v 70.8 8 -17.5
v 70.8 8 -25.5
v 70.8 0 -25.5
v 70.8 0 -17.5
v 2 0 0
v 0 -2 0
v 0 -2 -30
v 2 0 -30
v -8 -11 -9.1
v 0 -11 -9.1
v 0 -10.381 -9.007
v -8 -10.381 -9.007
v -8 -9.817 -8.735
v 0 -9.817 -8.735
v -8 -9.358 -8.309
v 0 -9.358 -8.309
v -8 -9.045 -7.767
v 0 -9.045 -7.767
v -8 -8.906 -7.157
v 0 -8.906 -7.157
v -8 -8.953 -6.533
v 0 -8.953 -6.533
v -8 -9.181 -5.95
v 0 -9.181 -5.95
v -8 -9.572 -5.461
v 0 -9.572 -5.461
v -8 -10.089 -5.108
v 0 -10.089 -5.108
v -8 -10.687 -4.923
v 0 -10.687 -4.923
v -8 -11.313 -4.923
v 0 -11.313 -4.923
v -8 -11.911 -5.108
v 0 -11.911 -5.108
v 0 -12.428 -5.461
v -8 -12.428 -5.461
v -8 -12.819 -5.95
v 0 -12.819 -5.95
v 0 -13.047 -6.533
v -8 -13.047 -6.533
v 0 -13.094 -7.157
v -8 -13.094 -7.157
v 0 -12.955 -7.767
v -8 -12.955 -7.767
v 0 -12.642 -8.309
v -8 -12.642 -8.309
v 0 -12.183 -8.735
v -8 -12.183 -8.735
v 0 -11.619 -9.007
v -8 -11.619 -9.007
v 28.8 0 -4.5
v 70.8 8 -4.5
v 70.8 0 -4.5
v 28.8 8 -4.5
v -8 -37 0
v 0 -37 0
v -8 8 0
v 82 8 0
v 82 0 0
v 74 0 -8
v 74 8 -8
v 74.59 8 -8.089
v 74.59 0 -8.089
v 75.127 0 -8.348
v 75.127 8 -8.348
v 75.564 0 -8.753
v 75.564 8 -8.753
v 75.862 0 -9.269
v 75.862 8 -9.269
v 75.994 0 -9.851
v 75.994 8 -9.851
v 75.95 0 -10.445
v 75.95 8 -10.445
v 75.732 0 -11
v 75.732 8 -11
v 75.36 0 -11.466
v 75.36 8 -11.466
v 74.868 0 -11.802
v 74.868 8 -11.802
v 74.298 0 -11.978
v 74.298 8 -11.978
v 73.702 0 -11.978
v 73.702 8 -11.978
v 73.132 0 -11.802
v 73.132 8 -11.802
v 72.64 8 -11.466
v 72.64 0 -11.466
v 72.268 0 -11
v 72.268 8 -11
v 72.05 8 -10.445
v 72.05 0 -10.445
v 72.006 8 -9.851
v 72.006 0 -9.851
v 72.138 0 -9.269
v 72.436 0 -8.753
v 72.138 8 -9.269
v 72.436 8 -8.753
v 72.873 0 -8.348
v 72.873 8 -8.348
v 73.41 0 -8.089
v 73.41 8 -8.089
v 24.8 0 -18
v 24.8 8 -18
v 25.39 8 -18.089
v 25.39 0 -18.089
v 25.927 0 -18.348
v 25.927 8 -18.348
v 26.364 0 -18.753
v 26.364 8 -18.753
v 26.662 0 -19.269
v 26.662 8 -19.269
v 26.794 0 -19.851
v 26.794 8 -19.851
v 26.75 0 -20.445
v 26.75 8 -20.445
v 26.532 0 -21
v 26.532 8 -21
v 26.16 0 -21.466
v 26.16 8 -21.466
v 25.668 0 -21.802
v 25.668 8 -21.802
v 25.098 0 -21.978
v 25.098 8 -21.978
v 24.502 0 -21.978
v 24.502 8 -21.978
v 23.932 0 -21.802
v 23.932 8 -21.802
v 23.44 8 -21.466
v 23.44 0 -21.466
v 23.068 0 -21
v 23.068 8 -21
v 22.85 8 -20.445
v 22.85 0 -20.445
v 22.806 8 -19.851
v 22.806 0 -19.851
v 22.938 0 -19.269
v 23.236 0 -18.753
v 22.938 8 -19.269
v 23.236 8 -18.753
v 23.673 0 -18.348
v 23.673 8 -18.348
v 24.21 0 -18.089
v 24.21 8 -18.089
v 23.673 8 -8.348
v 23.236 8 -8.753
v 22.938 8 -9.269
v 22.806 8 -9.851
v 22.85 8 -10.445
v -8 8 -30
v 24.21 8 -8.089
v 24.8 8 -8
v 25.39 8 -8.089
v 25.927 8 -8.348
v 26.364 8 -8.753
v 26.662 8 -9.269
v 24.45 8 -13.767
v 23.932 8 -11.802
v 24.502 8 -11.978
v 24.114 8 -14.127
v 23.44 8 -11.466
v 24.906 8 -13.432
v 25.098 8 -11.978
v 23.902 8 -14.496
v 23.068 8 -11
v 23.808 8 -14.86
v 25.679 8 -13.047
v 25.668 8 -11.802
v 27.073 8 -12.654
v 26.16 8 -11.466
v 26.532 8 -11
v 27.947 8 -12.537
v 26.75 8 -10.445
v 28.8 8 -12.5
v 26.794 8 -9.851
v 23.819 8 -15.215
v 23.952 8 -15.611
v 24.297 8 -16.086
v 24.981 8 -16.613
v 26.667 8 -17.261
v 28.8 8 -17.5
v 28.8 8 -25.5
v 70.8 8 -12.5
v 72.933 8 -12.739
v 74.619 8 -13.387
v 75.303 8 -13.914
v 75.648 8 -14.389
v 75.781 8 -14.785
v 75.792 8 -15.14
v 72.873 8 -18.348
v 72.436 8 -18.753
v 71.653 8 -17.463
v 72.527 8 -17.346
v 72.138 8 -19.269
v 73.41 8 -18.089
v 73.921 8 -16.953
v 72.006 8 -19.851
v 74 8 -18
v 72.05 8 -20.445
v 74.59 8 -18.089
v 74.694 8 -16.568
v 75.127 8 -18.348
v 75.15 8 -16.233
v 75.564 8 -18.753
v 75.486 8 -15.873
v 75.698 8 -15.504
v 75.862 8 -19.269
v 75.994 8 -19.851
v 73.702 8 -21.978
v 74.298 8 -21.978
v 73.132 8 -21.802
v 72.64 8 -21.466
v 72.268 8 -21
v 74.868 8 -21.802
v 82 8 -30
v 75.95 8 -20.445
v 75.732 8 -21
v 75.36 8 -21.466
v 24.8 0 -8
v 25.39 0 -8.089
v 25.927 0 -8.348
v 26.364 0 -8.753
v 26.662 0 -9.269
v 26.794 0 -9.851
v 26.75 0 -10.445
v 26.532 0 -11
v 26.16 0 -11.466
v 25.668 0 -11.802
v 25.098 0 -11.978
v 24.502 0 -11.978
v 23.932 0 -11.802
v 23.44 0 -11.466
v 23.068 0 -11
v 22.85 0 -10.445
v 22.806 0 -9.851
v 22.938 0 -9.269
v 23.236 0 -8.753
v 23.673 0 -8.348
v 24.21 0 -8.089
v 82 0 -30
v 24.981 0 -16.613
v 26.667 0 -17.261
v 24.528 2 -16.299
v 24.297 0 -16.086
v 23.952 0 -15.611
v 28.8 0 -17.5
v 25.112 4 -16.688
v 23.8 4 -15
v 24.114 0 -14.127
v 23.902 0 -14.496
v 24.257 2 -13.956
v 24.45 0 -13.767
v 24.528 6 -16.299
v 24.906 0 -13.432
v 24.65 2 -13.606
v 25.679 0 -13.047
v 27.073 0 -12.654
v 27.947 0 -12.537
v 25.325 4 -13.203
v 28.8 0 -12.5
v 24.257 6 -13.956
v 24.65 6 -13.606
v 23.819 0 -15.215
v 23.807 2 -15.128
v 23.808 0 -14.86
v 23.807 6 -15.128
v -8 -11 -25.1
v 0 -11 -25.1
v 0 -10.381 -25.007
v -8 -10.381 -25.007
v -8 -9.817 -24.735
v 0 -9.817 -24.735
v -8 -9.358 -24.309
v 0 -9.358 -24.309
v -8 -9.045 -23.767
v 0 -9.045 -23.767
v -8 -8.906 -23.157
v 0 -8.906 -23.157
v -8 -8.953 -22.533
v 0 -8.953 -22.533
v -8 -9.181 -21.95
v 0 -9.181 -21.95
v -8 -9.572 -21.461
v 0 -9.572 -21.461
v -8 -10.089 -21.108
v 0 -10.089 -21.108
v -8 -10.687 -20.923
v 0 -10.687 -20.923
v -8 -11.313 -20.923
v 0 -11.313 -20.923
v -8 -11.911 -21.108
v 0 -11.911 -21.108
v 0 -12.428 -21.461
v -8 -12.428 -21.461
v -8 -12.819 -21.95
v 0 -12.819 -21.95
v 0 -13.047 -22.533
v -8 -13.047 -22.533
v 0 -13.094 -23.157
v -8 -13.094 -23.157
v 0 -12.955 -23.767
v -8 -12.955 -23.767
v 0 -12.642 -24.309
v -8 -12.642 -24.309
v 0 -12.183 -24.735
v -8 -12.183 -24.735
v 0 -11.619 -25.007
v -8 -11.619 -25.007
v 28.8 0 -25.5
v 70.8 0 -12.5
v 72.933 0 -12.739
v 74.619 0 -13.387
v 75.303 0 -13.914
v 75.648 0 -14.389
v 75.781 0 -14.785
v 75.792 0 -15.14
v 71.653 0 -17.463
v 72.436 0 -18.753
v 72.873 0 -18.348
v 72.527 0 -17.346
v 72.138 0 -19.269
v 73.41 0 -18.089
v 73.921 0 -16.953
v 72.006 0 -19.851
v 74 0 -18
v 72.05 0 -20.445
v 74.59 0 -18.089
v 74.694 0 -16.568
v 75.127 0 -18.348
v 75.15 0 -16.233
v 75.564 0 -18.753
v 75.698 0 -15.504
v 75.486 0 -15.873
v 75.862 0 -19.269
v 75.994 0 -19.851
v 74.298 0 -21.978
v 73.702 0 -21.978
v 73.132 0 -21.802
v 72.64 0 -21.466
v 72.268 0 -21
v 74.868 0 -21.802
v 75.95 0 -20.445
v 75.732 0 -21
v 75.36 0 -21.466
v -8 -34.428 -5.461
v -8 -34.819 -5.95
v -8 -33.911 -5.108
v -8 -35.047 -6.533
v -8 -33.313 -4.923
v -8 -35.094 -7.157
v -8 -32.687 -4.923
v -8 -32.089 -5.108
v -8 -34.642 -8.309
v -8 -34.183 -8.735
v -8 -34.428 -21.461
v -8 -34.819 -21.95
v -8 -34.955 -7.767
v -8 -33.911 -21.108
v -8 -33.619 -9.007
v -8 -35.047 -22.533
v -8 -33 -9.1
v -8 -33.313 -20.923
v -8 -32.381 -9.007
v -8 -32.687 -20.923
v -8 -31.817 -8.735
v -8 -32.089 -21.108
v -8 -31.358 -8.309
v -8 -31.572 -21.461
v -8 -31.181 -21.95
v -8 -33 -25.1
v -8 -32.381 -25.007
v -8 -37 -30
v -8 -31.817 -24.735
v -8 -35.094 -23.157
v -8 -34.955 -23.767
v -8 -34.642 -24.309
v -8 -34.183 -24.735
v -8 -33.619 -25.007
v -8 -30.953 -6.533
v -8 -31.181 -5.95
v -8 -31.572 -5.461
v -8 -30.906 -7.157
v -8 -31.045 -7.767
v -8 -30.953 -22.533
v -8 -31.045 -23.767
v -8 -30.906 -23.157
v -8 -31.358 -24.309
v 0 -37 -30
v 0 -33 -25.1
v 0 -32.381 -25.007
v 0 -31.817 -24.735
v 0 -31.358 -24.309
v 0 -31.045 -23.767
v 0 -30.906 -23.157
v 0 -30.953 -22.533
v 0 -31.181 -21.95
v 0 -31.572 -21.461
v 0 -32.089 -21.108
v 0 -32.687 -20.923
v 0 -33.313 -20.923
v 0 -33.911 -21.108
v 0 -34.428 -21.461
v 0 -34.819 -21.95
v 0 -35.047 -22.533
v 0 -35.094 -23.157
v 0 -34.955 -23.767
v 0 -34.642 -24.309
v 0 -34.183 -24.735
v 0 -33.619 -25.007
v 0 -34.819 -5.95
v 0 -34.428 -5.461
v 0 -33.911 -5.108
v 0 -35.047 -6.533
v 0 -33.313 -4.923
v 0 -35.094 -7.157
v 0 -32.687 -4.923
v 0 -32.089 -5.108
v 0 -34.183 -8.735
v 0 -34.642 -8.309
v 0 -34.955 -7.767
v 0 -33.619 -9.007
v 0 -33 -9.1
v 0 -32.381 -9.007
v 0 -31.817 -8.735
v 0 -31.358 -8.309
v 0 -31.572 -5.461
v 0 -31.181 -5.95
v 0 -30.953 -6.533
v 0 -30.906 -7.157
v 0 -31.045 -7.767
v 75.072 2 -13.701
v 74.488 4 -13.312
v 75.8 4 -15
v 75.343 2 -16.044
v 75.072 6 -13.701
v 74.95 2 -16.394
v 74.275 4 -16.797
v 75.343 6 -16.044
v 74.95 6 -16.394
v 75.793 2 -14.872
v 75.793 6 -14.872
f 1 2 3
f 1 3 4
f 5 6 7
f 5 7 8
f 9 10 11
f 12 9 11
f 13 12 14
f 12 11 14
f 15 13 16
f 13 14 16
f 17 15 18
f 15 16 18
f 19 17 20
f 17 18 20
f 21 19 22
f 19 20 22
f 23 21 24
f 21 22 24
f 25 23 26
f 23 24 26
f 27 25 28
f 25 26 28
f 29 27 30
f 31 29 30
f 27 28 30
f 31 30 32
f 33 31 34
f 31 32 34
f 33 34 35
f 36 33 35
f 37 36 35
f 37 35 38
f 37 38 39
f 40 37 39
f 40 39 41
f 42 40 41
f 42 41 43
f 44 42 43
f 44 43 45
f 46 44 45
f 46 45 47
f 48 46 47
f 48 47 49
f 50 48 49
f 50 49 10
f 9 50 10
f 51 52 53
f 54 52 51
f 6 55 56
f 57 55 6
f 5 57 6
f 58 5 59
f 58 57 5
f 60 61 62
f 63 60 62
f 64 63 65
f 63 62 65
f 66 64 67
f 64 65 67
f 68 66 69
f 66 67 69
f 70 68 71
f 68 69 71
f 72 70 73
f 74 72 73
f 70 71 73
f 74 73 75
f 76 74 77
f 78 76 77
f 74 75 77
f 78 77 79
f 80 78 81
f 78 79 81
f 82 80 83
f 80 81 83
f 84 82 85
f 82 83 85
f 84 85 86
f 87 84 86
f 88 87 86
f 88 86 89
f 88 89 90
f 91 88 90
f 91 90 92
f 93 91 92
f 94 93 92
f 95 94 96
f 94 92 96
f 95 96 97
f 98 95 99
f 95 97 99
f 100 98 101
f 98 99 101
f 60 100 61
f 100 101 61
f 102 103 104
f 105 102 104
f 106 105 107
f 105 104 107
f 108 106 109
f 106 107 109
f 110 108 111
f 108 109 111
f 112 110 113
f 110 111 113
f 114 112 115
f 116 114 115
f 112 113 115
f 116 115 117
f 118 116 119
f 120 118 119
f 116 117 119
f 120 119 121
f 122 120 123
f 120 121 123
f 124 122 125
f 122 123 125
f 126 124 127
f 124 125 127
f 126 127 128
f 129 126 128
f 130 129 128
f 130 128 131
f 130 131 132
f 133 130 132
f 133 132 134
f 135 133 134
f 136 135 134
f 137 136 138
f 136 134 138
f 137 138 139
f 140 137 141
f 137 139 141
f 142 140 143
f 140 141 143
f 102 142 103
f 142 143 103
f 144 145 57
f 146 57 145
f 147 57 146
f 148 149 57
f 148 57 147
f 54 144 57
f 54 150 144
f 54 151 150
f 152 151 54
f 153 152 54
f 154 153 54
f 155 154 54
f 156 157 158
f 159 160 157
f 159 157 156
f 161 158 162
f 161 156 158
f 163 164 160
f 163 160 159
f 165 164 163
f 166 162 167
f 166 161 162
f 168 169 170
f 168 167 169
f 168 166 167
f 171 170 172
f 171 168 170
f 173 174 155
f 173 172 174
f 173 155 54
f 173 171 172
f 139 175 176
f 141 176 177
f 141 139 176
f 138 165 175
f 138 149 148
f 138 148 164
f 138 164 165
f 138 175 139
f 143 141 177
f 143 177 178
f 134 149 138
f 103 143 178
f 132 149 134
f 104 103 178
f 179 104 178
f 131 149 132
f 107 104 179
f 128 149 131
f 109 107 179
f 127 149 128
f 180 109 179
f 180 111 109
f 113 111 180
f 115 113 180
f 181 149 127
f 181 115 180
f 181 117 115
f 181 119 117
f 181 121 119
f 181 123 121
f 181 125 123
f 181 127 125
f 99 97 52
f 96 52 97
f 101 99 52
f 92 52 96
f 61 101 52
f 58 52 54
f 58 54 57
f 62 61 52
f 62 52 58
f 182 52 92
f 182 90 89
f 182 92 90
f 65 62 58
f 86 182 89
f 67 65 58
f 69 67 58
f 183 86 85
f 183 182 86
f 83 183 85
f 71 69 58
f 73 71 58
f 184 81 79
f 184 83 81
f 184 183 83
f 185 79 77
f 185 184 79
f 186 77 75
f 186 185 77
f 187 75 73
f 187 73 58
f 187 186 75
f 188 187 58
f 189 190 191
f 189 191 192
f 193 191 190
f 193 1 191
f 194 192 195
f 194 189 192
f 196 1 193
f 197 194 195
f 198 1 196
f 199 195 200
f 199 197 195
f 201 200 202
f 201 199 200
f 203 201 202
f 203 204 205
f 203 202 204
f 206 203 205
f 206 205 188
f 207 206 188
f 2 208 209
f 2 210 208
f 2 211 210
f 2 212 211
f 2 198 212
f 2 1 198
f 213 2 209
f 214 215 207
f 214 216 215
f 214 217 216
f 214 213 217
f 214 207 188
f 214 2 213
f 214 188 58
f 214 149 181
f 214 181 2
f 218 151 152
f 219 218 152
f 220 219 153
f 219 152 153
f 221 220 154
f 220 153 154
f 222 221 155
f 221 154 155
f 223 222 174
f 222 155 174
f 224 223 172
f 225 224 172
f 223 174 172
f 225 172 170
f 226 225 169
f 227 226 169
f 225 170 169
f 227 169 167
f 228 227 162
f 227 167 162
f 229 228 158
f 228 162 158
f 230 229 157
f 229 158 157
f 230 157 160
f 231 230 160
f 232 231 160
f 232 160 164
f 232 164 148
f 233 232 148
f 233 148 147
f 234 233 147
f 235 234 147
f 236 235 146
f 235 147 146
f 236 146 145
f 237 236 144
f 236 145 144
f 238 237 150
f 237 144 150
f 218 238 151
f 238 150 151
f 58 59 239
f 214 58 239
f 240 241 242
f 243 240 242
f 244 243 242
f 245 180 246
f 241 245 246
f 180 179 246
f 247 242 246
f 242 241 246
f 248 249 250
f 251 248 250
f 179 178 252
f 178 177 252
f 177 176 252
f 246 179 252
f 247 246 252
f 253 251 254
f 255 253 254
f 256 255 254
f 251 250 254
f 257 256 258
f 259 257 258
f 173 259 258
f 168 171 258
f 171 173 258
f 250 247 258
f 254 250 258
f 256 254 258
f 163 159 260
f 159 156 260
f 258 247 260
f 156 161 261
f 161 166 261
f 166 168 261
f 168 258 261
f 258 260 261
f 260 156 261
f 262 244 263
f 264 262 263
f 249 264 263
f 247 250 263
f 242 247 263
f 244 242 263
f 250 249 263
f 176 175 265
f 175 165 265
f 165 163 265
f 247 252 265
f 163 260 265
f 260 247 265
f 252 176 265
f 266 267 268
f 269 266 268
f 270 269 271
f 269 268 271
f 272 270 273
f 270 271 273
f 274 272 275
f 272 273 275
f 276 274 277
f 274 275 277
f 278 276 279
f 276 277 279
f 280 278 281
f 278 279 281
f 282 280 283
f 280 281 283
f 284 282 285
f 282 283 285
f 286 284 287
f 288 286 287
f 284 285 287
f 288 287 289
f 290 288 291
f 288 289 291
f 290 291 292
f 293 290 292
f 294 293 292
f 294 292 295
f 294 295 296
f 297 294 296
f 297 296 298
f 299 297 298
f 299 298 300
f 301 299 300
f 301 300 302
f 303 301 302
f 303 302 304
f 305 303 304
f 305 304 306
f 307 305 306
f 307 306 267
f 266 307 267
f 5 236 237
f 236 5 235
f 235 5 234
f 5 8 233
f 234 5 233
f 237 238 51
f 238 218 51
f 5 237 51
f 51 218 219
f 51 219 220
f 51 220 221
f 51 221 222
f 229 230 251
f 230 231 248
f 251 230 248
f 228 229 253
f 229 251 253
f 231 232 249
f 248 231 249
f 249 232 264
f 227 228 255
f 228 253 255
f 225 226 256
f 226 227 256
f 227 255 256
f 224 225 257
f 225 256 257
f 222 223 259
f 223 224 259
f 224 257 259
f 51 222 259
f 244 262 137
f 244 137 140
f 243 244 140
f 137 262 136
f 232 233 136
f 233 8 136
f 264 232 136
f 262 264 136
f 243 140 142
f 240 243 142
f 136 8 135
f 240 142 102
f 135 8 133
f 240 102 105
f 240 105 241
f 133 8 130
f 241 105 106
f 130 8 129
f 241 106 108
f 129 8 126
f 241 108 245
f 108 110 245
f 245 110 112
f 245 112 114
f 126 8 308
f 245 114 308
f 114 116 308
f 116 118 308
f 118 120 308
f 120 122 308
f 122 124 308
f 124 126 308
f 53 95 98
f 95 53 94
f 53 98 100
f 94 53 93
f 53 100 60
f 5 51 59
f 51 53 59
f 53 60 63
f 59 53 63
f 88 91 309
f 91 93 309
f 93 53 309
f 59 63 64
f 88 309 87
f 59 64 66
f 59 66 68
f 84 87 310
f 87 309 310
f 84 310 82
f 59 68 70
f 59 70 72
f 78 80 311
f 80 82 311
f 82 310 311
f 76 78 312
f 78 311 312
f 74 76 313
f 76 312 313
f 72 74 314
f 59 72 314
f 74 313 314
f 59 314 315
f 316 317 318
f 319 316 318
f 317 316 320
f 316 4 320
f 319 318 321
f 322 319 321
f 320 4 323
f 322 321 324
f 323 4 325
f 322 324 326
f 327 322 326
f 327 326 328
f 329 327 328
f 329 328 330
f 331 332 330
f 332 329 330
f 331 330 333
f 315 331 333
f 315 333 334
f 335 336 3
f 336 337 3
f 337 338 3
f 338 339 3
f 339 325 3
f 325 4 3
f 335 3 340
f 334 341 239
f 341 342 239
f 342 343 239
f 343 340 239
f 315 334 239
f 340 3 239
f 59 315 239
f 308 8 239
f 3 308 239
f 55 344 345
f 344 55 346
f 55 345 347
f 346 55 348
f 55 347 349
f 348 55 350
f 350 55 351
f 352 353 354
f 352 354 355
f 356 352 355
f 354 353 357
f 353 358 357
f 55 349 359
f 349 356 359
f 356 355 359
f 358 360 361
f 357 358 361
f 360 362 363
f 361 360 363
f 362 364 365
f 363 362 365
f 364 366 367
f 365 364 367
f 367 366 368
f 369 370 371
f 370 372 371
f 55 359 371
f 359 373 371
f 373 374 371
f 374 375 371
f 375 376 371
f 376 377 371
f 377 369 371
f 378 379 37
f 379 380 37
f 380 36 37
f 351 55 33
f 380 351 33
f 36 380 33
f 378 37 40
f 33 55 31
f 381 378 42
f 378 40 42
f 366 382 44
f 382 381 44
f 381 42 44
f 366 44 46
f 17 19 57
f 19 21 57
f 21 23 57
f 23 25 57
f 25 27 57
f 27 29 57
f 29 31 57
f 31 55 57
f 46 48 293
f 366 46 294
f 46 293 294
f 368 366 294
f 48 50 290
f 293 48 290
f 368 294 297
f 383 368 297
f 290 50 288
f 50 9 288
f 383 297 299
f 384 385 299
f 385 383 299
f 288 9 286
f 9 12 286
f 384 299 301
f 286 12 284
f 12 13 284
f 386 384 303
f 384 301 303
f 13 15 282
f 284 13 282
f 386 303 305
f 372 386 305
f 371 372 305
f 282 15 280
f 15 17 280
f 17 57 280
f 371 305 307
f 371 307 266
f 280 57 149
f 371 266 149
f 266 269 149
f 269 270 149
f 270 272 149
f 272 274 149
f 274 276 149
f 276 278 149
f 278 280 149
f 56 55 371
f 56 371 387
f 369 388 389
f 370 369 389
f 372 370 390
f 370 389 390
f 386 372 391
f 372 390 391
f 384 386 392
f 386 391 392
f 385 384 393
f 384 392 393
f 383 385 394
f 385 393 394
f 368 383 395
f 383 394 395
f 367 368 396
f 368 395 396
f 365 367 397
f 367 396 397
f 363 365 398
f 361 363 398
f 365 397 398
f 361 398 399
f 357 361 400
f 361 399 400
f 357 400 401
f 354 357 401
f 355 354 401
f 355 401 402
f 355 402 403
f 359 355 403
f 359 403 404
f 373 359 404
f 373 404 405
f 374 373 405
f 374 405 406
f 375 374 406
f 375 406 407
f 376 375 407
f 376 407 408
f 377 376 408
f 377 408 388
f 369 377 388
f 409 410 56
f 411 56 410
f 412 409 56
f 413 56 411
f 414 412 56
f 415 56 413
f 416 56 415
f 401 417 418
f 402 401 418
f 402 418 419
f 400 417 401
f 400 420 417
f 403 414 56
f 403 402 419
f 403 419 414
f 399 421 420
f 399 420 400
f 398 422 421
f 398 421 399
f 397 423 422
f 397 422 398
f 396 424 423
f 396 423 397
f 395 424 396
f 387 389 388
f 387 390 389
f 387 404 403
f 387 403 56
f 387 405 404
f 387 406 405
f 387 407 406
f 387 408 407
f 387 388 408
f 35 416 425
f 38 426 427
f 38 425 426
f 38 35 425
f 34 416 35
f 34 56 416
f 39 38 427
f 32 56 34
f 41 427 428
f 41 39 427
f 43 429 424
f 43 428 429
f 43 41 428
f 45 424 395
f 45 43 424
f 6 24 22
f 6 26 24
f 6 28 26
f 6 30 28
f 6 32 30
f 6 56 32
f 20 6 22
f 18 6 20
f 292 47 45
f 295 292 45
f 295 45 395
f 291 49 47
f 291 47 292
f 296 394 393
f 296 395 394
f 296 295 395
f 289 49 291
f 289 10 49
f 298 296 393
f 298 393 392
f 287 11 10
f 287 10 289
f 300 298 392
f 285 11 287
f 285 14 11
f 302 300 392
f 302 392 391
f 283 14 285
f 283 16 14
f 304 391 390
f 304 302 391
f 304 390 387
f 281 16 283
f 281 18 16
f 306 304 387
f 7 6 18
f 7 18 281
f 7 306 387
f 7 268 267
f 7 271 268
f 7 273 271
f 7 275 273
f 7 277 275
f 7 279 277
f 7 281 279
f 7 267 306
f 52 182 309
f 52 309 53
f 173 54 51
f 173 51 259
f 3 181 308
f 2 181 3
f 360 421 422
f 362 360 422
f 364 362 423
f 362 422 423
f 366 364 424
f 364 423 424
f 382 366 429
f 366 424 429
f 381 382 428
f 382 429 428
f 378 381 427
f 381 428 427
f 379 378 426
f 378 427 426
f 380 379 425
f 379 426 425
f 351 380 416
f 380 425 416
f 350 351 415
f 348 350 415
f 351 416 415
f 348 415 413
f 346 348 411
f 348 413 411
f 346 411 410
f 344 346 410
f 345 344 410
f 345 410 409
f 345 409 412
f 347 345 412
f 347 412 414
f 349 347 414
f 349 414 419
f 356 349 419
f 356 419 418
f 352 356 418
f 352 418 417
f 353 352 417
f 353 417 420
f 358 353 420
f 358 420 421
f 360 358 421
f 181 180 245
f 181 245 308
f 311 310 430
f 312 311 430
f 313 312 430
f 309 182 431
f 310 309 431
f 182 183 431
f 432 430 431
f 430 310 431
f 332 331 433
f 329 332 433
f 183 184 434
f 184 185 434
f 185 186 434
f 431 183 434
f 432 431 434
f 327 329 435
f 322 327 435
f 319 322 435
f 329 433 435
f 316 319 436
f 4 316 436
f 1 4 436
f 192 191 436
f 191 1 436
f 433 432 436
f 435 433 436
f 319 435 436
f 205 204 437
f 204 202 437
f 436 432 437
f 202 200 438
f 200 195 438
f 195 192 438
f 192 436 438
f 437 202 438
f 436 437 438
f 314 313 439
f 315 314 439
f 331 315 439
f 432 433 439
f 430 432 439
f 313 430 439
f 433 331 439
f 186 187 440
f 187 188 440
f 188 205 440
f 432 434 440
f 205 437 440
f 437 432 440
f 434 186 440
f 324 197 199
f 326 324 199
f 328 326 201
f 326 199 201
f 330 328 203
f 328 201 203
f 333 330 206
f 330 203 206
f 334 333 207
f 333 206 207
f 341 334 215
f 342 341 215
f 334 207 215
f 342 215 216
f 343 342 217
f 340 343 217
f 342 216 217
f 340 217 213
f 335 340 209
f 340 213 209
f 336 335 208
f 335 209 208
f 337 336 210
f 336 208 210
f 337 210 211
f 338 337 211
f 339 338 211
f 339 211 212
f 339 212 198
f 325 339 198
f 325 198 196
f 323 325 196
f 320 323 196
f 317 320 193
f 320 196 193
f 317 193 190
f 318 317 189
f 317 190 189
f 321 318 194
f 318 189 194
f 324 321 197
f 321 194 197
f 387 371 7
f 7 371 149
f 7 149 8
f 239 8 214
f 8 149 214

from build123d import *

# Parameters (mm, degrees)
SKETCH_1_W          = 82
SKETCH_1_H          = 30
EXTRUDE_1_DEPTH     = 8
SKETCH_2_R          = 2
CUT_EXTRUDE_1_DEPTH = 8
SKETCH_4_W          = 8
SKETCH_4_H          = 30
EXTRUDE_2_DEPTH     = 45
EXTRUDE_5_DEPTH     = 30
SKETCH_15_R         = 2.1
CUT_EXTRUDE_2_DEPTH = 10


with BuildPart() as part:
    # 草圖1 → 填料-伸長1 (new body)
    with BuildSketch(Plane(origin=(0, 0, 0), x_dir=(1, 0, 0), z_dir=(0, 1, 0))):
        with Locations((41, 15)):
            Rectangle(SKETCH_1_W, SKETCH_1_H)
    extrude(amount=EXTRUDE_1_DEPTH)

    # 草圖2 → 除料-伸長1 (cut)
    with BuildSketch(Plane(origin=(0, 8, 0), x_dir=(1, 0, 0), z_dir=(0, 1, 0))):
        with Locations(Location((74, 20, 0), (0, 0, 270))):
            Circle(SKETCH_2_R)
        with Locations(Location((74, 10, 0), (0, 0, 270))):
            Circle(SKETCH_2_R)
        with Locations(Location((24.8, 20, 0), (0, 0, 270))):
            Circle(SKETCH_2_R)
        with Locations(Location((24.8, 10, 0), (0, 0, 270))):
            Circle(SKETCH_2_R)
        with BuildLine():
            Line((28.8, 25.5), (70.8, 25.5))
            Line((70.8, 25.5), (70.8, 17.5))
            add(Edge.make_bspline(
                [(70.8, 12.5), (75.8, 12.5), (75.8, 15), (75.8, 17.5), (70.8, 17.5)],
                knots=[4.71238898, 4.71238898, 4.71238898, 6.283185307, 6.283185307, 7.853981634, 7.853981634, 7.853981634], degree=2, weights=[1, 0.707106781, 1, 0.707106781, 1]))
            Line((70.8, 12.5), (70.8, 4.5))
            Line((70.8, 4.5), (28.8, 4.5))
            Line((28.8, 4.5), (28.8, 12.5))
            add(Edge.make_bspline(
                [(28.8, 17.5), (23.8, 17.5), (23.8, 15), (23.8, 12.5), (28.8, 12.5)],
                knots=[1.570796327, 1.570796327, 1.570796327, 3.141592654, 3.141592654, 4.71238898, 4.71238898, 4.71238898], degree=2, weights=[1, 0.707106781, 1, 0.707106781, 1]))
            Line((28.8, 17.5), (28.8, 25.5))
        make_face()
    extrude(amount=-CUT_EXTRUDE_1_DEPTH, mode=Mode.SUBTRACT)

    # 草圖4 → 填料-伸長2 (add)
    with BuildSketch(Plane(origin=(0, 8, 0), x_dir=(1, 0, 0), z_dir=(0, 1, 0))):
        with Locations((-4, 15)):
            Rectangle(SKETCH_4_W, SKETCH_4_H)
    extrude(amount=-EXTRUDE_2_DEPTH)

    # 草圖14 → 填料-伸長5 (add)
    with BuildSketch(Plane.XY):
        Polygon((0, 0), (0, -2), (2, 0), align=None)
    extrude(amount=-EXTRUDE_5_DEPTH)

    # 草圖15 → 除料-伸長2 (cut)
    with BuildSketch(Plane(origin=(0, 0, 0), x_dir=(0, 0, -1), z_dir=(1, 0, 0))):
        with Locations((7, -33)):
            Circle(SKETCH_15_R)
        with Locations((7, -11)):
            Circle(SKETCH_15_R)
        with Locations((23, -11)):
            Circle(SKETCH_15_R)
        with Locations((23, -33)):
            Circle(SKETCH_15_R)
    extrude(amount=-CUT_EXTRUDE_2_DEPTH, mode=Mode.SUBTRACT)


solid = part.part
